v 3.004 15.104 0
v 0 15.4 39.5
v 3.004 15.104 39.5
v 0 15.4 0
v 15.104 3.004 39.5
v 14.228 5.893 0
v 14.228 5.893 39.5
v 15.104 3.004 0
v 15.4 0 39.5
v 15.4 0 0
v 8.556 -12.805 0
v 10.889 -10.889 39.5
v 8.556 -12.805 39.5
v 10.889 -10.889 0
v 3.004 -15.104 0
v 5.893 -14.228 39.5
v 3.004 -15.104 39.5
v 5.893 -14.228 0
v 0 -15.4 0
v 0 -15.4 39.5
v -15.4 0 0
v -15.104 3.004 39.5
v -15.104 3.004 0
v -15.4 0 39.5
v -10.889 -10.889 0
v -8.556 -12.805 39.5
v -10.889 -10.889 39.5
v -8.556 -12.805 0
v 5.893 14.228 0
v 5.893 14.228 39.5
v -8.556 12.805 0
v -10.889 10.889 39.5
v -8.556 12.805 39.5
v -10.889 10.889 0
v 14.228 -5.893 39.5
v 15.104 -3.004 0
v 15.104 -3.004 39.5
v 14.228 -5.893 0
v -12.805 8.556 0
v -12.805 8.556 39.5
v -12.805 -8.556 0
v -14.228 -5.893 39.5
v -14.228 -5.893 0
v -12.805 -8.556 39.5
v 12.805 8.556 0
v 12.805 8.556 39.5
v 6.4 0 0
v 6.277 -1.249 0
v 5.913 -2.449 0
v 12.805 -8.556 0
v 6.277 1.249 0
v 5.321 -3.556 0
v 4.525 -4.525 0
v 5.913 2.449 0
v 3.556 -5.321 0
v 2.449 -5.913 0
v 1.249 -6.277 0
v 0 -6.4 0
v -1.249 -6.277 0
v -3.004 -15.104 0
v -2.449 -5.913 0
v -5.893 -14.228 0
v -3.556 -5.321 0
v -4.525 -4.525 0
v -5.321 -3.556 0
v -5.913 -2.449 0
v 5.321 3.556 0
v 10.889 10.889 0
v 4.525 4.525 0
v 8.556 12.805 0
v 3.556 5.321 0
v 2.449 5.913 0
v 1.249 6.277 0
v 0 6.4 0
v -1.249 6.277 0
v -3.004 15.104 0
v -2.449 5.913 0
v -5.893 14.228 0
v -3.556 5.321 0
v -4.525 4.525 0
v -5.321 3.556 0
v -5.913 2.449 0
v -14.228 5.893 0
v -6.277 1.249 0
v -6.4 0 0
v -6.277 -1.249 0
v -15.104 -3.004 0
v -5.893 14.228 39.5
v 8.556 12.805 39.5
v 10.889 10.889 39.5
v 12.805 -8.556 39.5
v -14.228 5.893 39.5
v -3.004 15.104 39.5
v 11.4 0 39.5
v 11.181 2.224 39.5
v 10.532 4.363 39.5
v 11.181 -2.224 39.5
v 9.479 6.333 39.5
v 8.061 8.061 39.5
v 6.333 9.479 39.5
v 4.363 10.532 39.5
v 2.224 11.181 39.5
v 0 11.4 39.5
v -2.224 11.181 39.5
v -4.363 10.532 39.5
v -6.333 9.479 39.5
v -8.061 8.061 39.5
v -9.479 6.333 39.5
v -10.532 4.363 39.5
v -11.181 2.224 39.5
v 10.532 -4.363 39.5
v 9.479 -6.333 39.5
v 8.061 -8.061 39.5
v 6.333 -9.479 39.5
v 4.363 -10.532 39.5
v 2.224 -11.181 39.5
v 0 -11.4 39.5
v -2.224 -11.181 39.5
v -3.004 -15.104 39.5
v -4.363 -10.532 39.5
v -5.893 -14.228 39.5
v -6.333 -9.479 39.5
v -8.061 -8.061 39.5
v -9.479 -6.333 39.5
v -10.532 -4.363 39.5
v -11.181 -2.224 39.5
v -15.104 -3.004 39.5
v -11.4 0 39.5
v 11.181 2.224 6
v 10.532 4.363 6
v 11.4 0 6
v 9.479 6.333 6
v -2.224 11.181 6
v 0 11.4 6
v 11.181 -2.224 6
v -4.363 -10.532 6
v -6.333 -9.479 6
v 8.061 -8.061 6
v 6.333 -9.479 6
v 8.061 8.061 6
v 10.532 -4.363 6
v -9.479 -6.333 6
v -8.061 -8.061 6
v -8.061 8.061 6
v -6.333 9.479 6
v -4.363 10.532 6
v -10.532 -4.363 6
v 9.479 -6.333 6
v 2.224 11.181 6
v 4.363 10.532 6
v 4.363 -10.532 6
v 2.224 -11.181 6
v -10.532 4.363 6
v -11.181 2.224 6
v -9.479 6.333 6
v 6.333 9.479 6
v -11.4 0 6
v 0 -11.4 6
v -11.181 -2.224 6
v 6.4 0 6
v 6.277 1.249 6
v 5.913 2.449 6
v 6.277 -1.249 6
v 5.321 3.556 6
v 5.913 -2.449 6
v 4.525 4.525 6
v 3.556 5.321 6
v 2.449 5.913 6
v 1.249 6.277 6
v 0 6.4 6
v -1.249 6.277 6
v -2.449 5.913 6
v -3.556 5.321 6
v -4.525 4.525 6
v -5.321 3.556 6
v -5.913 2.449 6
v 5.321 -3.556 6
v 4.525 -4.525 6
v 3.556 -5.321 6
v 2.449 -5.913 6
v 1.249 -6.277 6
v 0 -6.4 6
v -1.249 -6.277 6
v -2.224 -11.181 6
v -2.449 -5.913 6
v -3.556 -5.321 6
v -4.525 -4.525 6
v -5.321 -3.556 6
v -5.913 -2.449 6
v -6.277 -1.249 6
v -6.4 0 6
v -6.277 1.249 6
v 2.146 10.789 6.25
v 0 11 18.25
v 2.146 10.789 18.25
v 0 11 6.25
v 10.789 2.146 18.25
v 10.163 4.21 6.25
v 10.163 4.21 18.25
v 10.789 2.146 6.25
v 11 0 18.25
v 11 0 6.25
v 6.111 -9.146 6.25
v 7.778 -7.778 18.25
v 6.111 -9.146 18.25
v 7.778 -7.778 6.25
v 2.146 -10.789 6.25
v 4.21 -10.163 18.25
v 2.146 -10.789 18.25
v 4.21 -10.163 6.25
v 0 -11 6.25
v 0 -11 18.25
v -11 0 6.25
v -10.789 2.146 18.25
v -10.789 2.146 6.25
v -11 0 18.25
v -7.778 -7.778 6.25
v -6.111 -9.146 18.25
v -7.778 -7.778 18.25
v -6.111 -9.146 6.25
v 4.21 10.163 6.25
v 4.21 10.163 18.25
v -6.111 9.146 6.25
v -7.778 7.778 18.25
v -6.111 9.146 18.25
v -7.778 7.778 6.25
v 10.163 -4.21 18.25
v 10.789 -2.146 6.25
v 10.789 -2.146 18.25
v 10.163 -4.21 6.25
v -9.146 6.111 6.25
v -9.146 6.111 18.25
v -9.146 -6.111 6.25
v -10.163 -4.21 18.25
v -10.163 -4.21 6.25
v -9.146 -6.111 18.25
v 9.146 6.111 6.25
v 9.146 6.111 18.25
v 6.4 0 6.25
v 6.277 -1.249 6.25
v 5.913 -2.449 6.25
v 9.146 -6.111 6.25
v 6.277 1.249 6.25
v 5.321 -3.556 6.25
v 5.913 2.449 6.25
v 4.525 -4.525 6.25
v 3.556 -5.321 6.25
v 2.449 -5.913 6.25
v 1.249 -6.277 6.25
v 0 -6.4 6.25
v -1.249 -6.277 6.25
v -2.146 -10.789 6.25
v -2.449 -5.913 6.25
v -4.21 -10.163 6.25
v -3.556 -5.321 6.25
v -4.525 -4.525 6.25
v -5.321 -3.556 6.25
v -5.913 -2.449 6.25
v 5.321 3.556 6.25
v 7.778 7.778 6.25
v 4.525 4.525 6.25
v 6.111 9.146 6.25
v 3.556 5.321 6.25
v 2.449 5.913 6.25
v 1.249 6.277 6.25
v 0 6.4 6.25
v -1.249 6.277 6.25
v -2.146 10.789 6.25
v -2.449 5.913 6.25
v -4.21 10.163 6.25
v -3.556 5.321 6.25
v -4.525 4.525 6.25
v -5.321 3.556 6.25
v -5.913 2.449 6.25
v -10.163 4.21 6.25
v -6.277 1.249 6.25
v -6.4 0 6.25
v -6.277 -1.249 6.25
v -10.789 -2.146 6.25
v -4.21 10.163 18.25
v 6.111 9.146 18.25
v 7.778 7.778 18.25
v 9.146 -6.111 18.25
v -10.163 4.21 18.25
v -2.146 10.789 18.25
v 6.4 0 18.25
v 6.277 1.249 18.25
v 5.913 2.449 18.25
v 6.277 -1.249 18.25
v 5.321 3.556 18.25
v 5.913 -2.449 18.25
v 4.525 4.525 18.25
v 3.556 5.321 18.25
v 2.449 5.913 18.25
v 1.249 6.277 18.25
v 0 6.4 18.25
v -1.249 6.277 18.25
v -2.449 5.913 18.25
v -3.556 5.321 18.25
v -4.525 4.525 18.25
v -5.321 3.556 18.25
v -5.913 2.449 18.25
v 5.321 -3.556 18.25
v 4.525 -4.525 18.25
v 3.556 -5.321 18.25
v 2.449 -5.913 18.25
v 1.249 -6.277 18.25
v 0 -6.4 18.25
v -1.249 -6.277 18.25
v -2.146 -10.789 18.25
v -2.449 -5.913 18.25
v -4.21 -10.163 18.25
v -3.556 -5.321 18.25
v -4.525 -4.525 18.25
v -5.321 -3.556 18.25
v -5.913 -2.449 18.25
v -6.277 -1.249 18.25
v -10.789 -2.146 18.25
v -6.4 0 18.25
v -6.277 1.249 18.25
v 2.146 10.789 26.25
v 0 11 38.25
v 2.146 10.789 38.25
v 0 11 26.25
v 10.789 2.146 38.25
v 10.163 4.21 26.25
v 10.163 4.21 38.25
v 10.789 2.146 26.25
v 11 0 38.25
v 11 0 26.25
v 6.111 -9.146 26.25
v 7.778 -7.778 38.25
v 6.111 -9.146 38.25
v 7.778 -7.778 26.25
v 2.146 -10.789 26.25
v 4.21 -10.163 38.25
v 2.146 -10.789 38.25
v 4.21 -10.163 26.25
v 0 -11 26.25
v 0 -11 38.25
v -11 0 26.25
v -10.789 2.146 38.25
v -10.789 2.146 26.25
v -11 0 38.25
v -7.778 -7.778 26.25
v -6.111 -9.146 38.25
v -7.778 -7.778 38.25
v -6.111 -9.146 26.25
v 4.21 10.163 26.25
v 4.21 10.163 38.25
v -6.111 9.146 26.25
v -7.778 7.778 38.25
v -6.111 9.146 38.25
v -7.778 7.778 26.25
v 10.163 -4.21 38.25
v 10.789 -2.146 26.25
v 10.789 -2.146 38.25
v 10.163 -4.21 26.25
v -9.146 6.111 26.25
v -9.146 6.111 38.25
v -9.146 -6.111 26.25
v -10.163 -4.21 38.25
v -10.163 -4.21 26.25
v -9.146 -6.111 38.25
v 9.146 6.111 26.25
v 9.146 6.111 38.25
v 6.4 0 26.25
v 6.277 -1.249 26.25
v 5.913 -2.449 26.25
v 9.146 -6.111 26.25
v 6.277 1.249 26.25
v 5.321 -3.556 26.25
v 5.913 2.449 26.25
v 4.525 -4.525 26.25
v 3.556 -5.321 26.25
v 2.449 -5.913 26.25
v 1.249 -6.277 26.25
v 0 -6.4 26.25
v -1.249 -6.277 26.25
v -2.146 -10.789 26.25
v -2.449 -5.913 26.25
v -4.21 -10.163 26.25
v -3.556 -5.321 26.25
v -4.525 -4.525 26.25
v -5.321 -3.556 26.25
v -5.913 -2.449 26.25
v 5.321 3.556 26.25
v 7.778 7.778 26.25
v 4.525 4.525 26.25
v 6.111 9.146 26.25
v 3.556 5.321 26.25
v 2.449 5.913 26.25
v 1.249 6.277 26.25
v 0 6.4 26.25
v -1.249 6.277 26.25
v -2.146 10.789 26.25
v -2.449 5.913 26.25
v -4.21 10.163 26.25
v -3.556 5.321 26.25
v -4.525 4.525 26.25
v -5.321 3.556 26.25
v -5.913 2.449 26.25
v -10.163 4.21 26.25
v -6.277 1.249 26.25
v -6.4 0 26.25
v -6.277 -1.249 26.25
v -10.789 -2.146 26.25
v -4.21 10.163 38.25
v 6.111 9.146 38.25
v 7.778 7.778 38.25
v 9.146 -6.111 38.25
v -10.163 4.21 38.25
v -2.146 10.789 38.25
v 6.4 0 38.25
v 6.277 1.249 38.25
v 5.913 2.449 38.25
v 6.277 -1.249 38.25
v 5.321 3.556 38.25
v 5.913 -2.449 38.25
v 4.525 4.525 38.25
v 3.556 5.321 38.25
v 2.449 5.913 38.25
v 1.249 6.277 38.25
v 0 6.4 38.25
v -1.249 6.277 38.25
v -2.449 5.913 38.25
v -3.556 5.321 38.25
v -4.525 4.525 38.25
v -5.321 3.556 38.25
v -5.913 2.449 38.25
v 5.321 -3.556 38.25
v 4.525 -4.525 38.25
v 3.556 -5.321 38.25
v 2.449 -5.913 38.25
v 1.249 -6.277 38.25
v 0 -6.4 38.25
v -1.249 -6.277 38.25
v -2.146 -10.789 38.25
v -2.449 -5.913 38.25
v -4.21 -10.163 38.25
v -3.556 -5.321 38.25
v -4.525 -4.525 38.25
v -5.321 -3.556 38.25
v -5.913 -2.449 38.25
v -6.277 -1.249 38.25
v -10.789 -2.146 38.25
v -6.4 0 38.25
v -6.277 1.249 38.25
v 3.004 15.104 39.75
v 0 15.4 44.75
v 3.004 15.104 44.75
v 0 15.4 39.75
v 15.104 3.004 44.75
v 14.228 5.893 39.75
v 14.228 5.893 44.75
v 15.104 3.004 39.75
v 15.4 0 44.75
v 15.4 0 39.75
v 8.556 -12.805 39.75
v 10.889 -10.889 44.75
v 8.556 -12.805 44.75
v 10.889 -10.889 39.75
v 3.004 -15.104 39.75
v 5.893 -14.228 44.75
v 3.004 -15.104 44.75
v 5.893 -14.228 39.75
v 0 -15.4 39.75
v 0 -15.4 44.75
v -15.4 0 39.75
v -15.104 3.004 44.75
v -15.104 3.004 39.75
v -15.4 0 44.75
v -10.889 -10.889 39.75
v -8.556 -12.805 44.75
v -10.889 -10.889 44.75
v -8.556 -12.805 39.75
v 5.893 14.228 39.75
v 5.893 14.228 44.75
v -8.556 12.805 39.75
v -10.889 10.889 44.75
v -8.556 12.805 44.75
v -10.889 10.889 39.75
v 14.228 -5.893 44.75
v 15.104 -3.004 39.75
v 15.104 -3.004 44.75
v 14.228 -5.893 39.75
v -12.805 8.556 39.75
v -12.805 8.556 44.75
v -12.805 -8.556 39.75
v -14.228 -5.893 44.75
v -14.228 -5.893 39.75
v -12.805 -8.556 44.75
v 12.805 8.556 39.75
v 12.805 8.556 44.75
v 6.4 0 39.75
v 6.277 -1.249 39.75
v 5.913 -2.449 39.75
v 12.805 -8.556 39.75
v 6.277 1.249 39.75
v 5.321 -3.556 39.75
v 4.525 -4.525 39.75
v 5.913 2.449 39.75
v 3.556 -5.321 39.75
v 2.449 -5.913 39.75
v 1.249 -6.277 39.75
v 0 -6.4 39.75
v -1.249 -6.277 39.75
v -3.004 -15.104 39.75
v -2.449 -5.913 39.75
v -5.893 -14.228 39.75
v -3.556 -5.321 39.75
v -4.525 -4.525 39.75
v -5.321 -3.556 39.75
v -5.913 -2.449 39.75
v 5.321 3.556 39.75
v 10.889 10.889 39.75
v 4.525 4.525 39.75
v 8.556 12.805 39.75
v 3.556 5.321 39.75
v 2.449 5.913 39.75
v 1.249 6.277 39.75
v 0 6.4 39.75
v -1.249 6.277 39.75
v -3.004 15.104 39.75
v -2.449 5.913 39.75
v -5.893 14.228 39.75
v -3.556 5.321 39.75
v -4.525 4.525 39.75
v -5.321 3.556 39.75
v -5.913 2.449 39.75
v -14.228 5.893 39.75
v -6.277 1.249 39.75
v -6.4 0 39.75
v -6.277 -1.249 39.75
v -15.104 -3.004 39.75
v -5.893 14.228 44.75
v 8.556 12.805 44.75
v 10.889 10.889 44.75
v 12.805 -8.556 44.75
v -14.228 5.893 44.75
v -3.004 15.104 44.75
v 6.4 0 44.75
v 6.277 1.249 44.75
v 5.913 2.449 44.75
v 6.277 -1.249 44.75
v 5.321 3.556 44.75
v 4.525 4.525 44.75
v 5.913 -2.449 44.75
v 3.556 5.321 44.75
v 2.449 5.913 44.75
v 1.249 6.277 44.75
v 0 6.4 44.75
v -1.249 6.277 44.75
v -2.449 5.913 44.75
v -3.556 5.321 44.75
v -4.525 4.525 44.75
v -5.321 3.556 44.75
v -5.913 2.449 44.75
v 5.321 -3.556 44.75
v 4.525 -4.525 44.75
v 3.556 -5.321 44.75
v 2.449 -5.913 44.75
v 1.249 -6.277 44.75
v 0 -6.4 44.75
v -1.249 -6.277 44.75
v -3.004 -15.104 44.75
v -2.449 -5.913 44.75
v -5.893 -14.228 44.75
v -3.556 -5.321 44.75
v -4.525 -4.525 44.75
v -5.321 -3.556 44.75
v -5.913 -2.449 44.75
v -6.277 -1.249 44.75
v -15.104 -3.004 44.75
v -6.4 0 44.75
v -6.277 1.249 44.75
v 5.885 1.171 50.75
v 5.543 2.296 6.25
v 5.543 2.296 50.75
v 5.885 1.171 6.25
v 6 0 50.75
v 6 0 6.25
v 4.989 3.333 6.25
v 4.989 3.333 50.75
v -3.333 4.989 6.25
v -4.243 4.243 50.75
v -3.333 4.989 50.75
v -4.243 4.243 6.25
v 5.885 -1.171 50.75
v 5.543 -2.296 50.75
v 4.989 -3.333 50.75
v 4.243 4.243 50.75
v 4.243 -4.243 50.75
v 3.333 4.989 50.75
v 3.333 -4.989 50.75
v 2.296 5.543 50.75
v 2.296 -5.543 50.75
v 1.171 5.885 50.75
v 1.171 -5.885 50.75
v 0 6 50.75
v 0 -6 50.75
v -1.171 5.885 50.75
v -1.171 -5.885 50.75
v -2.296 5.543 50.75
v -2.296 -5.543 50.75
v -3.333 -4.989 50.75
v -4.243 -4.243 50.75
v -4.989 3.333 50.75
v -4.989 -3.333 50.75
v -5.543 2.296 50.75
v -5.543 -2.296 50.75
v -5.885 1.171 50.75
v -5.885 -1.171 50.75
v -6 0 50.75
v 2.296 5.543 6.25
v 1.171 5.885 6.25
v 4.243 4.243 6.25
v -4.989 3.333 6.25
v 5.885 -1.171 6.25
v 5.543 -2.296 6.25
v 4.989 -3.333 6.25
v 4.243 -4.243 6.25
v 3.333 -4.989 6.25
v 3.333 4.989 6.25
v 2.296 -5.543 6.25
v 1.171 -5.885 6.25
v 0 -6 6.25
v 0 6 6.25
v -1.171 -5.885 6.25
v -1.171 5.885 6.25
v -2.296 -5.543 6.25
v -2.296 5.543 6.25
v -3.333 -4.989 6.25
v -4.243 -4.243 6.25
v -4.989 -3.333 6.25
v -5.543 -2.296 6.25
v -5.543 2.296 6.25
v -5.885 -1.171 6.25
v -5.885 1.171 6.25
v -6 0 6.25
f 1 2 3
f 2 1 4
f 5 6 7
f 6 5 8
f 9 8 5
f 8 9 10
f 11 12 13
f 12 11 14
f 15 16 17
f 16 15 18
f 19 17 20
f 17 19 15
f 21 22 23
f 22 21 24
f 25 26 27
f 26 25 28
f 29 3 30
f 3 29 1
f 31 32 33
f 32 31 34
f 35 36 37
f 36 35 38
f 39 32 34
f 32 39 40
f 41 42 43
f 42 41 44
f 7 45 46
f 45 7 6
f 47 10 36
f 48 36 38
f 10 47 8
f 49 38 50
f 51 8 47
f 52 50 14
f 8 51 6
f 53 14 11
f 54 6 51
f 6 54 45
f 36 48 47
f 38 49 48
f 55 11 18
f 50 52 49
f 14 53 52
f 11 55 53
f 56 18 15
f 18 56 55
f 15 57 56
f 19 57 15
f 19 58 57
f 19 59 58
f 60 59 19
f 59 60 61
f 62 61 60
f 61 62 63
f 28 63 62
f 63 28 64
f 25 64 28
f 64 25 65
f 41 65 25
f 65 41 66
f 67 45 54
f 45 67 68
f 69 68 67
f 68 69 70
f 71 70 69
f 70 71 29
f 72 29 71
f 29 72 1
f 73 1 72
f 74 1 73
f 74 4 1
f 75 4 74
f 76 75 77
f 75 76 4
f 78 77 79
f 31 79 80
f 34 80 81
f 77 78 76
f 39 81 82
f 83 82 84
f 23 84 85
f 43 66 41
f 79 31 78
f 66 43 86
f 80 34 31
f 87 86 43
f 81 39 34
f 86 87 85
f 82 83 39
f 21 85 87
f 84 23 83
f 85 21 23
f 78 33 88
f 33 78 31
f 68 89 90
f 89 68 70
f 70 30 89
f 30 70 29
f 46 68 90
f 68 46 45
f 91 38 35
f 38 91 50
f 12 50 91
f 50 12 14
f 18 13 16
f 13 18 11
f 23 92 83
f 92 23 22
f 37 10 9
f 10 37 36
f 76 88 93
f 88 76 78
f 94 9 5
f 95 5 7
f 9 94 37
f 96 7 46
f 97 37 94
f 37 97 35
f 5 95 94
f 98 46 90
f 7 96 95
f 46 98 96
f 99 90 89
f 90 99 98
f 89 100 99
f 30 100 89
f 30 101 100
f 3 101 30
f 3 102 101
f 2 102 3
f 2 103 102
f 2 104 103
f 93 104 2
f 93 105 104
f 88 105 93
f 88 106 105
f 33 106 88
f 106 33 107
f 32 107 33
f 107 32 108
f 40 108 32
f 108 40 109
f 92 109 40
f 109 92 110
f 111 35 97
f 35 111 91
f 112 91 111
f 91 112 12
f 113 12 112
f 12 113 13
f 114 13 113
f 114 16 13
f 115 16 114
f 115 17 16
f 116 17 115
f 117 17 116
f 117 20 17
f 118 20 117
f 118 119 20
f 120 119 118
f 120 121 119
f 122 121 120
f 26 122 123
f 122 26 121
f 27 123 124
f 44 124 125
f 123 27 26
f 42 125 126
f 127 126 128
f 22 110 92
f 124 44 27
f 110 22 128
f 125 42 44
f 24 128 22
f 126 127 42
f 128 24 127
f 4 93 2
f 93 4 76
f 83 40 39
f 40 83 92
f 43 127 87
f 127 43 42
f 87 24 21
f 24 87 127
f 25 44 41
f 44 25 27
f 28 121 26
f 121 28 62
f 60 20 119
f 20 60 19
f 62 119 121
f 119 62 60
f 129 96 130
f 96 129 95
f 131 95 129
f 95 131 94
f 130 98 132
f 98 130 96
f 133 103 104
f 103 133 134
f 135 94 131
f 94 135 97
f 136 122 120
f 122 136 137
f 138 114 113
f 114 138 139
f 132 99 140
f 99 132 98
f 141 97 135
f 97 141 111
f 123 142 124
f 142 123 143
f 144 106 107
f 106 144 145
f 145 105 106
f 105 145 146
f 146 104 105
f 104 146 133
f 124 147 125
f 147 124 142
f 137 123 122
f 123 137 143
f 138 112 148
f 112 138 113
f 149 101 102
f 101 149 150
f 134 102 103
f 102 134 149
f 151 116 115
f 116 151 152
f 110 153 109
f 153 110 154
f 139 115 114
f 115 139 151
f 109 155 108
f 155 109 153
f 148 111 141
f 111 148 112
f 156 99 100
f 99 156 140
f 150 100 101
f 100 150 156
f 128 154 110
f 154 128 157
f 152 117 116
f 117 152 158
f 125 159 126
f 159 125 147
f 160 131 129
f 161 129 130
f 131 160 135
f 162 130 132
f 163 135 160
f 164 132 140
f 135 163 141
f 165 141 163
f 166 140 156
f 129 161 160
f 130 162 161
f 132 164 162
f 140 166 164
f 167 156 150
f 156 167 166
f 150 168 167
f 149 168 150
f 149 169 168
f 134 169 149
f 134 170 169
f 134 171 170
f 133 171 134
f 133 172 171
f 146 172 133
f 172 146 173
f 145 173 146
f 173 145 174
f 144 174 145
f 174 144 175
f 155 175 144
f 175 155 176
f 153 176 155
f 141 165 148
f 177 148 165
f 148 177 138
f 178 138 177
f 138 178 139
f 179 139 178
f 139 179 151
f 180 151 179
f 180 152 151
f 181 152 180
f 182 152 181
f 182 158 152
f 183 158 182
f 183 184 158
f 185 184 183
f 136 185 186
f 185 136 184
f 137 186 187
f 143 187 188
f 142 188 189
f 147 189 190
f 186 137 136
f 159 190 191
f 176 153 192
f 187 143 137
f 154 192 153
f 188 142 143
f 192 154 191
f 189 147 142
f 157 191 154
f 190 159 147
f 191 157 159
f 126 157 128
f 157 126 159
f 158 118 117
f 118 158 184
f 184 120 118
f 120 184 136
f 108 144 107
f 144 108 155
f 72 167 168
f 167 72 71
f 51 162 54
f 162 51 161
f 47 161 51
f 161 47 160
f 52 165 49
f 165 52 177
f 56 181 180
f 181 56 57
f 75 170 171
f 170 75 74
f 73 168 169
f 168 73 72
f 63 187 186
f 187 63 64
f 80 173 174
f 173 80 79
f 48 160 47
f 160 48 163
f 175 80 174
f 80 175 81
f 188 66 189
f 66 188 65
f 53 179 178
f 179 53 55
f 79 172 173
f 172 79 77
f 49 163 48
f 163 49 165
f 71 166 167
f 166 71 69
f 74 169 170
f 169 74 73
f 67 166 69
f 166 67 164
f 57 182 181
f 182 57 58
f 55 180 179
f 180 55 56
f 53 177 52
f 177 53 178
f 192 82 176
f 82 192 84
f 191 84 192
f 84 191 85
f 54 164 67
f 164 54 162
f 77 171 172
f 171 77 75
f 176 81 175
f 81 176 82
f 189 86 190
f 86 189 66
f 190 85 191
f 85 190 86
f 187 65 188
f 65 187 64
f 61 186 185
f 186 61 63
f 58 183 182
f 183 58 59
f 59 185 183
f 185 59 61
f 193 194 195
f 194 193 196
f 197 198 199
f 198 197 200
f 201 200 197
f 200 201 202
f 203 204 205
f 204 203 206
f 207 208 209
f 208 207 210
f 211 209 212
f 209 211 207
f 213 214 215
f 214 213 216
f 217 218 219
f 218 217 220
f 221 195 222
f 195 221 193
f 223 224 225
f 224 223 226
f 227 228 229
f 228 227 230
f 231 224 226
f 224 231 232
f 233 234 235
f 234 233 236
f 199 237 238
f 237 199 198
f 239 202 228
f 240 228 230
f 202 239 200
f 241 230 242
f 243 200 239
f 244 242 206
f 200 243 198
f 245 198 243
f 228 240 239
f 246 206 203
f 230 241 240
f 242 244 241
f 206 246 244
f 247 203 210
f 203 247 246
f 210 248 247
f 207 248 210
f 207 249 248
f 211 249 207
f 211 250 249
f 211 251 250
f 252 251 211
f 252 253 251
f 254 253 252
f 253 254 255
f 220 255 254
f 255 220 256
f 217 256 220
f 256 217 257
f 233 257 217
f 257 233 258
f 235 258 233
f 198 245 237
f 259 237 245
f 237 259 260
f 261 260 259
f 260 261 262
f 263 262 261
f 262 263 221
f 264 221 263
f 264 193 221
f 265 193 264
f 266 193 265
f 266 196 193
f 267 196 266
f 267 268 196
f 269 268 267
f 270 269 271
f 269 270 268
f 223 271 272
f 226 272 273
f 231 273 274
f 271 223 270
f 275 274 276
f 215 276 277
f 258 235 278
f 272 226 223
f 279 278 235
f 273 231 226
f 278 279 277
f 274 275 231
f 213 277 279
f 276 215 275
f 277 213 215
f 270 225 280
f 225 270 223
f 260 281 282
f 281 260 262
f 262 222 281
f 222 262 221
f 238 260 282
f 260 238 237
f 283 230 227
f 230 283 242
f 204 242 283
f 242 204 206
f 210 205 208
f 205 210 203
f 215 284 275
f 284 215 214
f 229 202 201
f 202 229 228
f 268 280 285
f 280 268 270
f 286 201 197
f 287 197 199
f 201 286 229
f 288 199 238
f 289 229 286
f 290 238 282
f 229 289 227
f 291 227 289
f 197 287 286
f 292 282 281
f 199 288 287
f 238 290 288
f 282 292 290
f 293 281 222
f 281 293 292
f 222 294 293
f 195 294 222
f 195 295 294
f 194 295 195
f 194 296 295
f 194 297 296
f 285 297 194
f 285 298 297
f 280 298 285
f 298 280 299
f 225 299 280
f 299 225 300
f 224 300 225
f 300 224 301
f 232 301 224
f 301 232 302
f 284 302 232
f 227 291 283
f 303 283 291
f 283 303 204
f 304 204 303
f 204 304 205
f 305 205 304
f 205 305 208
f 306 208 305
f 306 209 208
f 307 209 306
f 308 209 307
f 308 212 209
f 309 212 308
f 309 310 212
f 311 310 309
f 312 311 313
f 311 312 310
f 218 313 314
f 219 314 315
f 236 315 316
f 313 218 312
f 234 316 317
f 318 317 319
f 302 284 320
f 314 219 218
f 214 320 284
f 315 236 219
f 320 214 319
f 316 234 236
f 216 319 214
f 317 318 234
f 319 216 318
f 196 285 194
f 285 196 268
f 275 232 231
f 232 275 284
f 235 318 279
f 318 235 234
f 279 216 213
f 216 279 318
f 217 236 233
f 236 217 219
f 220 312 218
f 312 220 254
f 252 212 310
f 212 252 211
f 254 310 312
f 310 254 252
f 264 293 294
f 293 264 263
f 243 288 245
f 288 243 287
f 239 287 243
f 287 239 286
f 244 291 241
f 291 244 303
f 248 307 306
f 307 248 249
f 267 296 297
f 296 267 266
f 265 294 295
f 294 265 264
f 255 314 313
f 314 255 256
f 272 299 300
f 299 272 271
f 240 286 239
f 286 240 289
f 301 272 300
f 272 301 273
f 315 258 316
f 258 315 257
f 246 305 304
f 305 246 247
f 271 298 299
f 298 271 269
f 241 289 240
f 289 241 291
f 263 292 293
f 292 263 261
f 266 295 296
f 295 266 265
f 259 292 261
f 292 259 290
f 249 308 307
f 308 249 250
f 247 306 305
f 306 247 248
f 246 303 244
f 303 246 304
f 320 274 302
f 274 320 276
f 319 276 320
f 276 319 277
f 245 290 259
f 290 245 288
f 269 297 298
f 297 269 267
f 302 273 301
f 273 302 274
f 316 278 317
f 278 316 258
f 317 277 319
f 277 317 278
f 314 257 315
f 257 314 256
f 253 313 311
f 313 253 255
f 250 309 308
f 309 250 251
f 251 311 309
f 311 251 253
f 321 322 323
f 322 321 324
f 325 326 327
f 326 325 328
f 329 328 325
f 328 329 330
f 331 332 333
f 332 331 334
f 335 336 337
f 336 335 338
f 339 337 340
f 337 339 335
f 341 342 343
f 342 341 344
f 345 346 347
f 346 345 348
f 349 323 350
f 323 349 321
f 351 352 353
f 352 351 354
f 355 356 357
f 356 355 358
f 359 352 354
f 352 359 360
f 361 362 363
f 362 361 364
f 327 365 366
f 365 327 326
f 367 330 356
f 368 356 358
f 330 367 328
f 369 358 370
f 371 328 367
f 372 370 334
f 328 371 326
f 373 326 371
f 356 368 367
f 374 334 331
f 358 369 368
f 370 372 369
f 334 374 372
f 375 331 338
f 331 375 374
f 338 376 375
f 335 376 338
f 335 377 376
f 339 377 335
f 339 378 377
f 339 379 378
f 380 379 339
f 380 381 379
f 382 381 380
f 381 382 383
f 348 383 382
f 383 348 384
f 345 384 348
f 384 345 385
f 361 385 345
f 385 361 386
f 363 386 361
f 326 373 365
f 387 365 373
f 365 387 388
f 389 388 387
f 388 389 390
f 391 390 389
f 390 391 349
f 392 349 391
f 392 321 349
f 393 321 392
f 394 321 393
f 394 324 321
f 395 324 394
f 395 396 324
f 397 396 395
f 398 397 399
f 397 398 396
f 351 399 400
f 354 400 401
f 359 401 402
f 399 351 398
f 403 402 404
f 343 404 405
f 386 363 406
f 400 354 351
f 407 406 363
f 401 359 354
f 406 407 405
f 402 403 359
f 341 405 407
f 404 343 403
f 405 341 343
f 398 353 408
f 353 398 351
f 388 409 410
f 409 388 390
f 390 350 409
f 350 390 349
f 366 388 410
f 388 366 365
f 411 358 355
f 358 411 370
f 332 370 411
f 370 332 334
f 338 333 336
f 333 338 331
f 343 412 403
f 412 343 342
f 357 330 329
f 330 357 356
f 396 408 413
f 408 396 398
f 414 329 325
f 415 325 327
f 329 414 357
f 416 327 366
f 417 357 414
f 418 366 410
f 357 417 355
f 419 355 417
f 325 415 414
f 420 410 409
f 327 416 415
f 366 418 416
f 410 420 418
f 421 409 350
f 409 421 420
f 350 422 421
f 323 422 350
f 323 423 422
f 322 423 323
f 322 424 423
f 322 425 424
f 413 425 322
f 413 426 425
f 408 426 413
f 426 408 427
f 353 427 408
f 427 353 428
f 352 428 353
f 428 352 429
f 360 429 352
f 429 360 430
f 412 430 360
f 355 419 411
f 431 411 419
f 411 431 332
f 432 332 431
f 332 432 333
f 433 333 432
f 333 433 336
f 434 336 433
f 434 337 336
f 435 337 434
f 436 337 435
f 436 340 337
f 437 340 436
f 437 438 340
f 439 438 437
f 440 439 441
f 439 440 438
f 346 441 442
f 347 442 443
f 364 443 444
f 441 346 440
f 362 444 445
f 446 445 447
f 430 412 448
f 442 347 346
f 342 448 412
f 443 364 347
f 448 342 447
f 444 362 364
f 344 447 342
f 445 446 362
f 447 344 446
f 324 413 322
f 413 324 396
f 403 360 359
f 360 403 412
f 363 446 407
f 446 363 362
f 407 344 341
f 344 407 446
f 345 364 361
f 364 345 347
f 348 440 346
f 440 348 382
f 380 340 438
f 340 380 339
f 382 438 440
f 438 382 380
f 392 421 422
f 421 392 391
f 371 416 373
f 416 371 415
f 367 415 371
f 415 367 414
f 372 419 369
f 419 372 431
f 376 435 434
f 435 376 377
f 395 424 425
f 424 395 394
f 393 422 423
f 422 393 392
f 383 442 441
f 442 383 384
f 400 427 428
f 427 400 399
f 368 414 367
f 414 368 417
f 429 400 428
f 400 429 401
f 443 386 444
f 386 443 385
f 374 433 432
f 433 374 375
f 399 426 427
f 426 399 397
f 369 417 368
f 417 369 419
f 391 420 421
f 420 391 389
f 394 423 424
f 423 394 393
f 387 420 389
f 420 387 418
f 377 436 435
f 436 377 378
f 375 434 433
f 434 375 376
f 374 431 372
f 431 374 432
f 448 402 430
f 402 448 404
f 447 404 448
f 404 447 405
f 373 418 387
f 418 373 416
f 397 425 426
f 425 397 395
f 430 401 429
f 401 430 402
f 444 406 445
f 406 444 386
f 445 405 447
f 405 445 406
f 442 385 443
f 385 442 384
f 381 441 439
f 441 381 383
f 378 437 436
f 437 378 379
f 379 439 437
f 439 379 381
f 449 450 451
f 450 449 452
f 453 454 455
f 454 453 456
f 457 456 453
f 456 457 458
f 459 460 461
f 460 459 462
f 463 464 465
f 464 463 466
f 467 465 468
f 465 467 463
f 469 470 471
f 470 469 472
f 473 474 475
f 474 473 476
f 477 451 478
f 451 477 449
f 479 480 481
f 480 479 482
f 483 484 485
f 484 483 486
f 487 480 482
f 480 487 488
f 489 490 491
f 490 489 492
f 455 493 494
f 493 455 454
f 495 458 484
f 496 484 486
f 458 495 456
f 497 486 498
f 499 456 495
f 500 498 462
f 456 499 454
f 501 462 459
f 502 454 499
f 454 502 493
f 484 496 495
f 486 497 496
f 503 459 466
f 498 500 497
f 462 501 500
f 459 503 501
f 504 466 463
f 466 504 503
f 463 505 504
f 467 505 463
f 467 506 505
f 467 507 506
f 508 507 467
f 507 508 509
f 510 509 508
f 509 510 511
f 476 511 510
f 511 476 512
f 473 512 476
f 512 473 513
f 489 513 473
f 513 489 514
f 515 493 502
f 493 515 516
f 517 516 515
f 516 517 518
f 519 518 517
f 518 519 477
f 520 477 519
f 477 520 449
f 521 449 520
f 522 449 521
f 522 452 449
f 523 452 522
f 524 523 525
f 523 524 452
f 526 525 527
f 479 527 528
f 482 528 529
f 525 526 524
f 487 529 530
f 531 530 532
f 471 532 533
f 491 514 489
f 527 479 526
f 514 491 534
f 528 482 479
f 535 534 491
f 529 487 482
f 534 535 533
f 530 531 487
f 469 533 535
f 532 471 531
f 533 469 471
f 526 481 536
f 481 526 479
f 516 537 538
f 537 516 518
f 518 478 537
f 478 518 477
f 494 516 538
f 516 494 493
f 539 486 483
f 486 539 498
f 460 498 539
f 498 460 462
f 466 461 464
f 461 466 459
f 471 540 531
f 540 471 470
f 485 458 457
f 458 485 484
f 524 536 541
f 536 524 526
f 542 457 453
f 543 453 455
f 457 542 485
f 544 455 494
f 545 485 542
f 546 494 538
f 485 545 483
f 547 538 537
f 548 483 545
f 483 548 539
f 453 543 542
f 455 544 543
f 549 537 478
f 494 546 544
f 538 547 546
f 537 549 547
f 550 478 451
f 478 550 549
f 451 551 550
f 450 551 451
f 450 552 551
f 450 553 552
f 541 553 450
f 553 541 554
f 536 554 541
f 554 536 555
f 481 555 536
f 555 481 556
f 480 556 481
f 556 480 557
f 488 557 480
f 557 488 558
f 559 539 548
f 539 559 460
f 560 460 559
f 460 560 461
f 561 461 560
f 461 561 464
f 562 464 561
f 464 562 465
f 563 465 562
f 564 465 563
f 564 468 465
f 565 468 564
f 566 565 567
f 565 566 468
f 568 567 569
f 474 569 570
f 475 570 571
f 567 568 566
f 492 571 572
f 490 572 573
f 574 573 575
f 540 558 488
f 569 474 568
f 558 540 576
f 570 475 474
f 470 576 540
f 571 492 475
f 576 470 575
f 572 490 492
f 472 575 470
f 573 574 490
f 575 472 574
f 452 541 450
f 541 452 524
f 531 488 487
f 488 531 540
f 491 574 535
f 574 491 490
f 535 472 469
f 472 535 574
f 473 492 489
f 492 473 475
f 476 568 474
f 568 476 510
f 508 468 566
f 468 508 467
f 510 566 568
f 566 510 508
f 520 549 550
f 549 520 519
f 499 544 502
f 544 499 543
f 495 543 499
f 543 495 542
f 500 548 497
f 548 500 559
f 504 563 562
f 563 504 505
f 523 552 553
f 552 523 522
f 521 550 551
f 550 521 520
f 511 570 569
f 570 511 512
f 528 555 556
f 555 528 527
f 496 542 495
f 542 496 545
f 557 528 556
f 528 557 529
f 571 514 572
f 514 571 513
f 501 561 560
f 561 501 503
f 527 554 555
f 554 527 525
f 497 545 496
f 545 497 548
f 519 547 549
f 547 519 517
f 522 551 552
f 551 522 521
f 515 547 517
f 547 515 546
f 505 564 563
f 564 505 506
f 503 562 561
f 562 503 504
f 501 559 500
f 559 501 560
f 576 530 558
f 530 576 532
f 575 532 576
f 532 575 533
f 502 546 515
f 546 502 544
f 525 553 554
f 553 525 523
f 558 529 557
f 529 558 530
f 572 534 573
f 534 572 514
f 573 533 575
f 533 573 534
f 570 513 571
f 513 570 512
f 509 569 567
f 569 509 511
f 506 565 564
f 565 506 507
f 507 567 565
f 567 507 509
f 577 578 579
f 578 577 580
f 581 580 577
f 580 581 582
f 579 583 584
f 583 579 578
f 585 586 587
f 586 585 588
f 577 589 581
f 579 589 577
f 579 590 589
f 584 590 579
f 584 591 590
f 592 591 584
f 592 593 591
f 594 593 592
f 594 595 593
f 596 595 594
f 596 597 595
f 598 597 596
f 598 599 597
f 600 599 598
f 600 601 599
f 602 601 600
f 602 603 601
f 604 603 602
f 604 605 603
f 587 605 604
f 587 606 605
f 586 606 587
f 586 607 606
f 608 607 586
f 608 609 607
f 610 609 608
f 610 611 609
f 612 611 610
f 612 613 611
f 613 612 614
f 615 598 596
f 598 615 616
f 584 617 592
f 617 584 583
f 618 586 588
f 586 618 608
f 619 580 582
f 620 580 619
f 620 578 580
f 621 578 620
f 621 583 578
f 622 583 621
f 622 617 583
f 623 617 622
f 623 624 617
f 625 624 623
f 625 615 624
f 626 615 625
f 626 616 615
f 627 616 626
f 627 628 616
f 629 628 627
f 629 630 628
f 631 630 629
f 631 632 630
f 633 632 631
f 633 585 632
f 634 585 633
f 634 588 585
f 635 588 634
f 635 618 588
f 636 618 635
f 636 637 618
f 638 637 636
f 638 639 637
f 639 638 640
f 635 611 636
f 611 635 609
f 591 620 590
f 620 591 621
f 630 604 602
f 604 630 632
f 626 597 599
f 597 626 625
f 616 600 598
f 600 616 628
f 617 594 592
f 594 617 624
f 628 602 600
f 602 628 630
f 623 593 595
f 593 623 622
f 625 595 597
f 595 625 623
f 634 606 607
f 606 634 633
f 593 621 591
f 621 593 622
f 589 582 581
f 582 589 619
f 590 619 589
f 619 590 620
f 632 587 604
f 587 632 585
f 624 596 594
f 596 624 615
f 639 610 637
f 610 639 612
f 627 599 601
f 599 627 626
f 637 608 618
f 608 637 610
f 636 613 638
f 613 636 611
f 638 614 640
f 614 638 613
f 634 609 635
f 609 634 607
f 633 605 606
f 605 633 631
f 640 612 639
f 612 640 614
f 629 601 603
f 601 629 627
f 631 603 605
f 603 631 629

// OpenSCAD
$fn = 32;

// ------------------------------------------------------------------------
// Shaft station: cup d30.8 x 39.5 mm, shaft d12
// Every part is its own module, assembly() places every instance.
// ------------------------------------------------------------------------

// --- part 1 ---
module housing_cup() {
  difference() {
    cylinder(h = 39.5, d = 30.8);
    translate([0, 0, 6]) cylinder(h = 34.5, d = 22.8);
    translate([0, 0, -1]) cylinder(h = 8, d = 12.8);
  }
}

// --- part 2 ---
module bearing_lower() {
  difference() {
      translate([0, 0, 0]) cylinder(h = 12, d = 22);
      translate([0, 0, -1]) cylinder(h = 14, d = 12.8);
    }
}

// --- part 3 ---
module bearing_upper() {
  difference() {
      translate([0, 0, 0]) cylinder(h = 12, d = 22);
      translate([0, 0, -1]) cylinder(h = 14, d = 12.8);
    }
}

// --- part 4 ---
module station_shaft() {
  translate([0, 0, -22.25]) cylinder(h = 44.5, d = 12);
}

// --- part 5 ---
module station_cover() {
  difference() {
    cylinder(h = 5, d = 30.8);
    translate([0, 0, -1]) cylinder(h = 7, d = 12.8);
  }
}

// --- assembly ---
module assembly() {
  color([0.80, 0.24, 0.20]) translate([0, 0, 0]) rotate([0, 0, 0]) housing_cup();
  color([0.20, 0.45, 0.75]) translate([0, 0, 6.25]) rotate([0, 0, 0]) bearing_lower();
  color([0.25, 0.62, 0.32]) translate([0, 0, 26.25]) rotate([0, 0, 0]) bearing_upper();
  color([0.92, 0.70, 0.18]) translate([0, 0, 28.5]) rotate([0, 0, 0]) station_shaft();
  color([0.58, 0.35, 0.70]) translate([0, 0, 39.75]) rotate([0, 0, 0]) station_cover();
}

assembly();
